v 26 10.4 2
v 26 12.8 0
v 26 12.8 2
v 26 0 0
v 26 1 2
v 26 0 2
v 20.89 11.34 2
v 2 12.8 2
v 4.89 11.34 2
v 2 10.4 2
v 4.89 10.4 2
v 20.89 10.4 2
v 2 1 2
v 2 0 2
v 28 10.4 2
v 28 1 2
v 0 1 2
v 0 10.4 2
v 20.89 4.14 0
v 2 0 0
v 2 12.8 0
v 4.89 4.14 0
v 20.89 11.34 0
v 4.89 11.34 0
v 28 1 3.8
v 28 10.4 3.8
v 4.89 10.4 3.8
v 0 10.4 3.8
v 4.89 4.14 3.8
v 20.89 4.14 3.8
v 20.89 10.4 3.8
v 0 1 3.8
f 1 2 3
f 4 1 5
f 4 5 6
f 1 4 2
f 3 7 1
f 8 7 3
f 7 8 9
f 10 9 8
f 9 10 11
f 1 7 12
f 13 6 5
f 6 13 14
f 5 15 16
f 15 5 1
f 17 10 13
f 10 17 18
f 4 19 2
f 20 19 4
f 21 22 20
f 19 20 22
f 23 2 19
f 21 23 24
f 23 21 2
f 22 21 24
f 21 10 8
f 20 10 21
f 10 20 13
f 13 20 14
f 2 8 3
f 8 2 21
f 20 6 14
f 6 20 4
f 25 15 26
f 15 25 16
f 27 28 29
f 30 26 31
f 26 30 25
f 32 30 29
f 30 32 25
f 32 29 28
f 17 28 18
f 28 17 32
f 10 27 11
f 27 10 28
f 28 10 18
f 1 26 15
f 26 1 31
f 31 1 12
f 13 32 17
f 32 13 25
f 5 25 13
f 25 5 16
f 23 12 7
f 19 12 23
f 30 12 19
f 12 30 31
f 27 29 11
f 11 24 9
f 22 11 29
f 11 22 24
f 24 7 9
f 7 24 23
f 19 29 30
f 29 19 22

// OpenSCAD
// Millimetres. Printed outer face down; assembled PCB +Y is toward the user.
// Positive dy moves the opening toward the keyboard front; positive dz raises it.
// Set blank=true to print a closed measuring/drilling blank.
dy=0.0; dz=0.0; opening_w=16.0; opening_h=7.2; blank=false;
outer_w=24.0; flange_w=28.0;
outer_bottom=-2.0; outer_top=10.8;
center_y=14.5; nominal_y=13.39; nominal_z=5.74;
assert(nominal_y+dy-opening_w/2 >= center_y-outer_w/2+1);
assert(nominal_y+dy+opening_w/2 <= center_y+outer_w/2-1);
assert(nominal_z+dz-opening_h/2 >= outer_bottom+1);
assert(nominal_z+dz+opening_h/2 <= outer_top-1);
difference() {
  union() {
    translate([(flange_w-outer_w)/2,0,0]) cube([outer_w,outer_top-outer_bottom,2.0]);
    translate([0,1.0,2.0])
      cube([flange_w,9.4,1.8]);
  }
  if(!blank) translate([flange_w/2+nominal_y-center_y+dy-opening_w/2,nominal_z+dz-outer_bottom-opening_h/2,-1])
    cube([opening_w,opening_h,10]);
}
